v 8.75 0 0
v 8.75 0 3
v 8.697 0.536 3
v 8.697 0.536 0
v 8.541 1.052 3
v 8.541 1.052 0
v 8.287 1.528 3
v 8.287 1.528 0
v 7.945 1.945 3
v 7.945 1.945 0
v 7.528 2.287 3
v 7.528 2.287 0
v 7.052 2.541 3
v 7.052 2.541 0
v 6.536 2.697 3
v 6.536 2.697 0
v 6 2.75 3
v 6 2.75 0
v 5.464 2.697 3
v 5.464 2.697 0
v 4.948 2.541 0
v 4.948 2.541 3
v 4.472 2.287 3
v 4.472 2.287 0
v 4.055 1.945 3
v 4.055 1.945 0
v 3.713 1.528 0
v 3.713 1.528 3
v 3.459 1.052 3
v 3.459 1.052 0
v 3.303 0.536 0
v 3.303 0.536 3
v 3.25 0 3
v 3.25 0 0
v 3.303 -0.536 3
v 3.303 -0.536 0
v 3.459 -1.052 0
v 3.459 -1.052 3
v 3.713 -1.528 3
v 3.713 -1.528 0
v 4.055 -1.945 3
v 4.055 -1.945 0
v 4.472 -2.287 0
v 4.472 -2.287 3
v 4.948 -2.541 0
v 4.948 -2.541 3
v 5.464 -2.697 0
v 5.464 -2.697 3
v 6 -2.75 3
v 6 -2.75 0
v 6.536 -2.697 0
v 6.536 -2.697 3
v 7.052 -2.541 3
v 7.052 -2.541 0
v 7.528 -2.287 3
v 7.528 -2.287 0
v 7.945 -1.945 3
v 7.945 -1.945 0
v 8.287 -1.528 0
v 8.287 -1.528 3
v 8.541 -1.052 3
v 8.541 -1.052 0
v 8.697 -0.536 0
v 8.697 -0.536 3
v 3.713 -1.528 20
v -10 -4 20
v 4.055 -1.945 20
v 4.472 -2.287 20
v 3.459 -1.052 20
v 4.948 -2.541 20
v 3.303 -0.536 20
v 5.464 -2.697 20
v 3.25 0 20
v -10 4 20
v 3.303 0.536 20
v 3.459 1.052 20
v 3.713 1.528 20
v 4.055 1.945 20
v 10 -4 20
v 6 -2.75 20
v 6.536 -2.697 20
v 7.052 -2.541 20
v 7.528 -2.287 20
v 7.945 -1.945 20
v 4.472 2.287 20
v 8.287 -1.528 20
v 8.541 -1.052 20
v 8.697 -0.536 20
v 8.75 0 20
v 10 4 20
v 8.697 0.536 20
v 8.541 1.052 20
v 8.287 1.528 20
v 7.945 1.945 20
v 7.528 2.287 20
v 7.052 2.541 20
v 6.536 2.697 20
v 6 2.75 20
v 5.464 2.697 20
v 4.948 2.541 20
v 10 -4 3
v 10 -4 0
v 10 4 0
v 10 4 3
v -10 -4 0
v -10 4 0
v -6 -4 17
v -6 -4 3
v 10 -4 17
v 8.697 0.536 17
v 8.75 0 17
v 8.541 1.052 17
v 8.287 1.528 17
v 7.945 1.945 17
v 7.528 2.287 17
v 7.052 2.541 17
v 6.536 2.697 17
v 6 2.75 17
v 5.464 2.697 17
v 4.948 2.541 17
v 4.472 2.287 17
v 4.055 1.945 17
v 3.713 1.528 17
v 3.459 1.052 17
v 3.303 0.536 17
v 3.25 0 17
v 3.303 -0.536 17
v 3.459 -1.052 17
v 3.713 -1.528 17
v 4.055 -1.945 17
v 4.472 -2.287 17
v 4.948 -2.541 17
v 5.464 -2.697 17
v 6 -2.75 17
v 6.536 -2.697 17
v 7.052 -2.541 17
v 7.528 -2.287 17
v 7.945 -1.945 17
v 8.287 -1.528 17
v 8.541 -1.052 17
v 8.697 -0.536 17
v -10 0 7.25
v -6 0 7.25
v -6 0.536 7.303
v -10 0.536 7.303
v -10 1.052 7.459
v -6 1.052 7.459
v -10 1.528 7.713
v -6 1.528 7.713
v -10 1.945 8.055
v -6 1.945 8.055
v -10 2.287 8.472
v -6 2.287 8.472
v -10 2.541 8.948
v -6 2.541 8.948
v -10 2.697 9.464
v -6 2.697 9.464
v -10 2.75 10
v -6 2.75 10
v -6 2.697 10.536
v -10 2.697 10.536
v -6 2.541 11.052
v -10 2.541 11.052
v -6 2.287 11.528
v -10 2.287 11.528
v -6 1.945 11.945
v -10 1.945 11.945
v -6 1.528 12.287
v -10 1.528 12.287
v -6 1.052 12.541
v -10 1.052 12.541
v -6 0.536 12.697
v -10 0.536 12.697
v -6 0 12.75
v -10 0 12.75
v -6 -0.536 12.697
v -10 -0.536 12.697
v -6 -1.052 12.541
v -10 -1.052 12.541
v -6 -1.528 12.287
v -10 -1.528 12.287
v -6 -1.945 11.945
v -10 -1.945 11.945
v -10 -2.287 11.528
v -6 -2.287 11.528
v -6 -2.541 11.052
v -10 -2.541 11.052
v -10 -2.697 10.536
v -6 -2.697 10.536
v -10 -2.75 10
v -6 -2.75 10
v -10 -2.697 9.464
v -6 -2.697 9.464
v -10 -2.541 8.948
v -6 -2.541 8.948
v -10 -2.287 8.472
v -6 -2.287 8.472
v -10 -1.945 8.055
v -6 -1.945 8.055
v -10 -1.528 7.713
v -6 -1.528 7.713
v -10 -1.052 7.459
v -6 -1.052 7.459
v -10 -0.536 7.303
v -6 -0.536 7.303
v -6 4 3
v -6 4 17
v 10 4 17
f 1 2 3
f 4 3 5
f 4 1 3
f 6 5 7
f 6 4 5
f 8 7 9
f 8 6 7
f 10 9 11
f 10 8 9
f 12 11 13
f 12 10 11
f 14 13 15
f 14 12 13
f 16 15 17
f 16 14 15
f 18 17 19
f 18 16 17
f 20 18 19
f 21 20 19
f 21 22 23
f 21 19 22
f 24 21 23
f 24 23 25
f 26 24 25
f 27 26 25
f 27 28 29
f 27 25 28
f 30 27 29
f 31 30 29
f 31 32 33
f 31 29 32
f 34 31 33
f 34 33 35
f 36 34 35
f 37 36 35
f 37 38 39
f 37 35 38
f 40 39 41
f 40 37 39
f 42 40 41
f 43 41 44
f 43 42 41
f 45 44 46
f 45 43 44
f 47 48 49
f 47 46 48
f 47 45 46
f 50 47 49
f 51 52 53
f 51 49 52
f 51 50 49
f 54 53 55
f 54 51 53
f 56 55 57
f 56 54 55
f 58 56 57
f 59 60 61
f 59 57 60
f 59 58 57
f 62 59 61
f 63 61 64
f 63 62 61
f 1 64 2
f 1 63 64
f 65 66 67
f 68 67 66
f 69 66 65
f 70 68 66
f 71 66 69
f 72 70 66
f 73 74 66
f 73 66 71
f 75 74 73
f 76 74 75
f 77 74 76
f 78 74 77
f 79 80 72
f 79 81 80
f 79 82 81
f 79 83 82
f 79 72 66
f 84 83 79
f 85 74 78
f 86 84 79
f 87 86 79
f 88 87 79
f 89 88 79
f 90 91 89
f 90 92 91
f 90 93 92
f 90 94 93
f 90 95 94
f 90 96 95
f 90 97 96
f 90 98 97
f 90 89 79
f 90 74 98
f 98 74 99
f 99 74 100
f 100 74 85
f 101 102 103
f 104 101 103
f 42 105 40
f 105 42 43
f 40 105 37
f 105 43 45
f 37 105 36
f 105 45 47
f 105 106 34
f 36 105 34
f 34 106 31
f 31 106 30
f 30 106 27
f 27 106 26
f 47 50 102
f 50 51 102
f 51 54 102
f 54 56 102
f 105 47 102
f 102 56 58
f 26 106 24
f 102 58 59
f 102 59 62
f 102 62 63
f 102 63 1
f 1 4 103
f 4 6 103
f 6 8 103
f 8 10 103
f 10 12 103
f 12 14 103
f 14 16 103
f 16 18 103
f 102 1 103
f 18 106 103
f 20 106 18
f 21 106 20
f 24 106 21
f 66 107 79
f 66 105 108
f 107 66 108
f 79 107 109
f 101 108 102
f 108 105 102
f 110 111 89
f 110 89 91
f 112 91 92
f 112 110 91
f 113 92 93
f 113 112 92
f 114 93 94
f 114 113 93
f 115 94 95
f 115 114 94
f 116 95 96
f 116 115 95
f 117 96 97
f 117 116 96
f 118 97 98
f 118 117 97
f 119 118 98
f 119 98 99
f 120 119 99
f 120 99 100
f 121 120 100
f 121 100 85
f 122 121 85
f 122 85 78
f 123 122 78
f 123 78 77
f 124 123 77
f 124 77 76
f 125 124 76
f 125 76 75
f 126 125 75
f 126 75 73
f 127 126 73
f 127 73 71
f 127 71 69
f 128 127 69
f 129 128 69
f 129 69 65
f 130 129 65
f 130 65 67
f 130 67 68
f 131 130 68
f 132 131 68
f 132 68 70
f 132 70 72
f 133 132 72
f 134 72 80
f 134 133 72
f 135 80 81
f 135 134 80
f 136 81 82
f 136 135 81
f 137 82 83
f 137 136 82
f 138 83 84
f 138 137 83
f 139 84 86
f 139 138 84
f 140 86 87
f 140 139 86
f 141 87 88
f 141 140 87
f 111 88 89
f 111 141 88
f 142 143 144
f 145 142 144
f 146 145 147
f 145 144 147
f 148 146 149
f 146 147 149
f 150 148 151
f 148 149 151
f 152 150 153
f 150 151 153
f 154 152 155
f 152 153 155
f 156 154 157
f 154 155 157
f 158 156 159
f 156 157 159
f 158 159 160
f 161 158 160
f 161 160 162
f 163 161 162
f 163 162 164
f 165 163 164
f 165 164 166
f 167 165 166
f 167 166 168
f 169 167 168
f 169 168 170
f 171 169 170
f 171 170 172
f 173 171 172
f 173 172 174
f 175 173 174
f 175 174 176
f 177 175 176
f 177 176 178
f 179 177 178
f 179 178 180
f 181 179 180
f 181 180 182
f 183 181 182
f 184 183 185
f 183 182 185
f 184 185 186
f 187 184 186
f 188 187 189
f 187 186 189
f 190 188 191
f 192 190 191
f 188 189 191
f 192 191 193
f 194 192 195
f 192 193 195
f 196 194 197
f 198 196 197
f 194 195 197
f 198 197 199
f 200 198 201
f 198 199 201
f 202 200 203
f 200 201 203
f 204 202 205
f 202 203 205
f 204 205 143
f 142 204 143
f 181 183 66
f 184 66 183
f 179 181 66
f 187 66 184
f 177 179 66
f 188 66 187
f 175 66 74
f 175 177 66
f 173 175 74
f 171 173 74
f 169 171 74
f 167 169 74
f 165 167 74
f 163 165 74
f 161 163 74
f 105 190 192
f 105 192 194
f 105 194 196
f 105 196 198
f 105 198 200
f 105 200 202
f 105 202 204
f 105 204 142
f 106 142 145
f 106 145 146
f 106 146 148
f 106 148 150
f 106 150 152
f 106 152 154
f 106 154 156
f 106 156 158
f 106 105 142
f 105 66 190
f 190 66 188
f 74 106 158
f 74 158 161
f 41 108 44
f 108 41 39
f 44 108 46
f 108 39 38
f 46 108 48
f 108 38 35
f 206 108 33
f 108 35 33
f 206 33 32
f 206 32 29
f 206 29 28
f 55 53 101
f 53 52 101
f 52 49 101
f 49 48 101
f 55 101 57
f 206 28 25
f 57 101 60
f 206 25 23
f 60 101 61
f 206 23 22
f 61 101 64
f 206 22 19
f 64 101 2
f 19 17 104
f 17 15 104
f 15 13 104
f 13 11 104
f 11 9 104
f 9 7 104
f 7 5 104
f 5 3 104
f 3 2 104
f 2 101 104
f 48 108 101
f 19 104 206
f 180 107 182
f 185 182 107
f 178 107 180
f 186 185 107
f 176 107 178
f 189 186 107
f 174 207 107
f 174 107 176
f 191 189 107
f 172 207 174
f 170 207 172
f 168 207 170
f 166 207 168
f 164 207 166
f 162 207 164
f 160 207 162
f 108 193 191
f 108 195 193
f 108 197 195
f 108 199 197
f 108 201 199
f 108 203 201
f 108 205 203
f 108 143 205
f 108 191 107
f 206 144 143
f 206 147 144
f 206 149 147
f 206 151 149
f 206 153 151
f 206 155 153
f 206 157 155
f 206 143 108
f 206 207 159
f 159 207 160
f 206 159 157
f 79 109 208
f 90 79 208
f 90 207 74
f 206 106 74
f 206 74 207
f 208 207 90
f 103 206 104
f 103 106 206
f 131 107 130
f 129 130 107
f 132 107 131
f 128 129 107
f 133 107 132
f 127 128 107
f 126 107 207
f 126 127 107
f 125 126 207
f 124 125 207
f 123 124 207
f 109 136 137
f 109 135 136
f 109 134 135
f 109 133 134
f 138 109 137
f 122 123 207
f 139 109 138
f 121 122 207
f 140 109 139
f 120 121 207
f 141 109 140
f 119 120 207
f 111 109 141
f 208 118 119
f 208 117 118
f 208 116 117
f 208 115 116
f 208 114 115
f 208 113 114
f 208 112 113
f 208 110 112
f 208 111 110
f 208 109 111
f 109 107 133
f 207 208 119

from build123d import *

# Parameters (mm, degrees)
SKETCH1_W           = 20
SKETCH1_H           = 8
SKETCH1_R           = 2.75
BOSS_EXTRUDE1_DEPTH = 20
SKETCH2_W           = 14
SKETCH2_H           = 8
CUT_EXTRUDE1_DEPTH  = 16
SKETCH3_R           = 2.75
CUT_EXTRUDE2_DEPTH  = 26.922962794


with BuildPart() as part:
    # Sketch1 → Boss-Extrude1 (new body)
    with BuildSketch(Plane.XY):
        Rectangle(SKETCH1_W, SKETCH1_H)
        with Locations((6, 0)):
            Circle(SKETCH1_R, mode=Mode.SUBTRACT)
    extrude(amount=BOSS_EXTRUDE1_DEPTH)

    # Sketch2 → Cut-Extrude1 (cut)
    with BuildSketch(Plane(origin=(10, 0, 0), x_dir=(0, 0, -1), z_dir=(1, 0, 0))):
        with Locations((-10, 0)):
            Rectangle(SKETCH2_W, SKETCH2_H)
    extrude(amount=-CUT_EXTRUDE1_DEPTH, mode=Mode.SUBTRACT)

    # Sketch3 → Cut-Extrude2 (cut, through all)
    with BuildSketch(Plane(origin=(-6, 0, 0), x_dir=(0, 0, -1), z_dir=(1, 0, 0))):
        with Locations((-10, 0)):
            Circle(SKETCH3_R)
    extrude(amount=-CUT_EXTRUDE2_DEPTH, mode=Mode.SUBTRACT)


solid = part.part
